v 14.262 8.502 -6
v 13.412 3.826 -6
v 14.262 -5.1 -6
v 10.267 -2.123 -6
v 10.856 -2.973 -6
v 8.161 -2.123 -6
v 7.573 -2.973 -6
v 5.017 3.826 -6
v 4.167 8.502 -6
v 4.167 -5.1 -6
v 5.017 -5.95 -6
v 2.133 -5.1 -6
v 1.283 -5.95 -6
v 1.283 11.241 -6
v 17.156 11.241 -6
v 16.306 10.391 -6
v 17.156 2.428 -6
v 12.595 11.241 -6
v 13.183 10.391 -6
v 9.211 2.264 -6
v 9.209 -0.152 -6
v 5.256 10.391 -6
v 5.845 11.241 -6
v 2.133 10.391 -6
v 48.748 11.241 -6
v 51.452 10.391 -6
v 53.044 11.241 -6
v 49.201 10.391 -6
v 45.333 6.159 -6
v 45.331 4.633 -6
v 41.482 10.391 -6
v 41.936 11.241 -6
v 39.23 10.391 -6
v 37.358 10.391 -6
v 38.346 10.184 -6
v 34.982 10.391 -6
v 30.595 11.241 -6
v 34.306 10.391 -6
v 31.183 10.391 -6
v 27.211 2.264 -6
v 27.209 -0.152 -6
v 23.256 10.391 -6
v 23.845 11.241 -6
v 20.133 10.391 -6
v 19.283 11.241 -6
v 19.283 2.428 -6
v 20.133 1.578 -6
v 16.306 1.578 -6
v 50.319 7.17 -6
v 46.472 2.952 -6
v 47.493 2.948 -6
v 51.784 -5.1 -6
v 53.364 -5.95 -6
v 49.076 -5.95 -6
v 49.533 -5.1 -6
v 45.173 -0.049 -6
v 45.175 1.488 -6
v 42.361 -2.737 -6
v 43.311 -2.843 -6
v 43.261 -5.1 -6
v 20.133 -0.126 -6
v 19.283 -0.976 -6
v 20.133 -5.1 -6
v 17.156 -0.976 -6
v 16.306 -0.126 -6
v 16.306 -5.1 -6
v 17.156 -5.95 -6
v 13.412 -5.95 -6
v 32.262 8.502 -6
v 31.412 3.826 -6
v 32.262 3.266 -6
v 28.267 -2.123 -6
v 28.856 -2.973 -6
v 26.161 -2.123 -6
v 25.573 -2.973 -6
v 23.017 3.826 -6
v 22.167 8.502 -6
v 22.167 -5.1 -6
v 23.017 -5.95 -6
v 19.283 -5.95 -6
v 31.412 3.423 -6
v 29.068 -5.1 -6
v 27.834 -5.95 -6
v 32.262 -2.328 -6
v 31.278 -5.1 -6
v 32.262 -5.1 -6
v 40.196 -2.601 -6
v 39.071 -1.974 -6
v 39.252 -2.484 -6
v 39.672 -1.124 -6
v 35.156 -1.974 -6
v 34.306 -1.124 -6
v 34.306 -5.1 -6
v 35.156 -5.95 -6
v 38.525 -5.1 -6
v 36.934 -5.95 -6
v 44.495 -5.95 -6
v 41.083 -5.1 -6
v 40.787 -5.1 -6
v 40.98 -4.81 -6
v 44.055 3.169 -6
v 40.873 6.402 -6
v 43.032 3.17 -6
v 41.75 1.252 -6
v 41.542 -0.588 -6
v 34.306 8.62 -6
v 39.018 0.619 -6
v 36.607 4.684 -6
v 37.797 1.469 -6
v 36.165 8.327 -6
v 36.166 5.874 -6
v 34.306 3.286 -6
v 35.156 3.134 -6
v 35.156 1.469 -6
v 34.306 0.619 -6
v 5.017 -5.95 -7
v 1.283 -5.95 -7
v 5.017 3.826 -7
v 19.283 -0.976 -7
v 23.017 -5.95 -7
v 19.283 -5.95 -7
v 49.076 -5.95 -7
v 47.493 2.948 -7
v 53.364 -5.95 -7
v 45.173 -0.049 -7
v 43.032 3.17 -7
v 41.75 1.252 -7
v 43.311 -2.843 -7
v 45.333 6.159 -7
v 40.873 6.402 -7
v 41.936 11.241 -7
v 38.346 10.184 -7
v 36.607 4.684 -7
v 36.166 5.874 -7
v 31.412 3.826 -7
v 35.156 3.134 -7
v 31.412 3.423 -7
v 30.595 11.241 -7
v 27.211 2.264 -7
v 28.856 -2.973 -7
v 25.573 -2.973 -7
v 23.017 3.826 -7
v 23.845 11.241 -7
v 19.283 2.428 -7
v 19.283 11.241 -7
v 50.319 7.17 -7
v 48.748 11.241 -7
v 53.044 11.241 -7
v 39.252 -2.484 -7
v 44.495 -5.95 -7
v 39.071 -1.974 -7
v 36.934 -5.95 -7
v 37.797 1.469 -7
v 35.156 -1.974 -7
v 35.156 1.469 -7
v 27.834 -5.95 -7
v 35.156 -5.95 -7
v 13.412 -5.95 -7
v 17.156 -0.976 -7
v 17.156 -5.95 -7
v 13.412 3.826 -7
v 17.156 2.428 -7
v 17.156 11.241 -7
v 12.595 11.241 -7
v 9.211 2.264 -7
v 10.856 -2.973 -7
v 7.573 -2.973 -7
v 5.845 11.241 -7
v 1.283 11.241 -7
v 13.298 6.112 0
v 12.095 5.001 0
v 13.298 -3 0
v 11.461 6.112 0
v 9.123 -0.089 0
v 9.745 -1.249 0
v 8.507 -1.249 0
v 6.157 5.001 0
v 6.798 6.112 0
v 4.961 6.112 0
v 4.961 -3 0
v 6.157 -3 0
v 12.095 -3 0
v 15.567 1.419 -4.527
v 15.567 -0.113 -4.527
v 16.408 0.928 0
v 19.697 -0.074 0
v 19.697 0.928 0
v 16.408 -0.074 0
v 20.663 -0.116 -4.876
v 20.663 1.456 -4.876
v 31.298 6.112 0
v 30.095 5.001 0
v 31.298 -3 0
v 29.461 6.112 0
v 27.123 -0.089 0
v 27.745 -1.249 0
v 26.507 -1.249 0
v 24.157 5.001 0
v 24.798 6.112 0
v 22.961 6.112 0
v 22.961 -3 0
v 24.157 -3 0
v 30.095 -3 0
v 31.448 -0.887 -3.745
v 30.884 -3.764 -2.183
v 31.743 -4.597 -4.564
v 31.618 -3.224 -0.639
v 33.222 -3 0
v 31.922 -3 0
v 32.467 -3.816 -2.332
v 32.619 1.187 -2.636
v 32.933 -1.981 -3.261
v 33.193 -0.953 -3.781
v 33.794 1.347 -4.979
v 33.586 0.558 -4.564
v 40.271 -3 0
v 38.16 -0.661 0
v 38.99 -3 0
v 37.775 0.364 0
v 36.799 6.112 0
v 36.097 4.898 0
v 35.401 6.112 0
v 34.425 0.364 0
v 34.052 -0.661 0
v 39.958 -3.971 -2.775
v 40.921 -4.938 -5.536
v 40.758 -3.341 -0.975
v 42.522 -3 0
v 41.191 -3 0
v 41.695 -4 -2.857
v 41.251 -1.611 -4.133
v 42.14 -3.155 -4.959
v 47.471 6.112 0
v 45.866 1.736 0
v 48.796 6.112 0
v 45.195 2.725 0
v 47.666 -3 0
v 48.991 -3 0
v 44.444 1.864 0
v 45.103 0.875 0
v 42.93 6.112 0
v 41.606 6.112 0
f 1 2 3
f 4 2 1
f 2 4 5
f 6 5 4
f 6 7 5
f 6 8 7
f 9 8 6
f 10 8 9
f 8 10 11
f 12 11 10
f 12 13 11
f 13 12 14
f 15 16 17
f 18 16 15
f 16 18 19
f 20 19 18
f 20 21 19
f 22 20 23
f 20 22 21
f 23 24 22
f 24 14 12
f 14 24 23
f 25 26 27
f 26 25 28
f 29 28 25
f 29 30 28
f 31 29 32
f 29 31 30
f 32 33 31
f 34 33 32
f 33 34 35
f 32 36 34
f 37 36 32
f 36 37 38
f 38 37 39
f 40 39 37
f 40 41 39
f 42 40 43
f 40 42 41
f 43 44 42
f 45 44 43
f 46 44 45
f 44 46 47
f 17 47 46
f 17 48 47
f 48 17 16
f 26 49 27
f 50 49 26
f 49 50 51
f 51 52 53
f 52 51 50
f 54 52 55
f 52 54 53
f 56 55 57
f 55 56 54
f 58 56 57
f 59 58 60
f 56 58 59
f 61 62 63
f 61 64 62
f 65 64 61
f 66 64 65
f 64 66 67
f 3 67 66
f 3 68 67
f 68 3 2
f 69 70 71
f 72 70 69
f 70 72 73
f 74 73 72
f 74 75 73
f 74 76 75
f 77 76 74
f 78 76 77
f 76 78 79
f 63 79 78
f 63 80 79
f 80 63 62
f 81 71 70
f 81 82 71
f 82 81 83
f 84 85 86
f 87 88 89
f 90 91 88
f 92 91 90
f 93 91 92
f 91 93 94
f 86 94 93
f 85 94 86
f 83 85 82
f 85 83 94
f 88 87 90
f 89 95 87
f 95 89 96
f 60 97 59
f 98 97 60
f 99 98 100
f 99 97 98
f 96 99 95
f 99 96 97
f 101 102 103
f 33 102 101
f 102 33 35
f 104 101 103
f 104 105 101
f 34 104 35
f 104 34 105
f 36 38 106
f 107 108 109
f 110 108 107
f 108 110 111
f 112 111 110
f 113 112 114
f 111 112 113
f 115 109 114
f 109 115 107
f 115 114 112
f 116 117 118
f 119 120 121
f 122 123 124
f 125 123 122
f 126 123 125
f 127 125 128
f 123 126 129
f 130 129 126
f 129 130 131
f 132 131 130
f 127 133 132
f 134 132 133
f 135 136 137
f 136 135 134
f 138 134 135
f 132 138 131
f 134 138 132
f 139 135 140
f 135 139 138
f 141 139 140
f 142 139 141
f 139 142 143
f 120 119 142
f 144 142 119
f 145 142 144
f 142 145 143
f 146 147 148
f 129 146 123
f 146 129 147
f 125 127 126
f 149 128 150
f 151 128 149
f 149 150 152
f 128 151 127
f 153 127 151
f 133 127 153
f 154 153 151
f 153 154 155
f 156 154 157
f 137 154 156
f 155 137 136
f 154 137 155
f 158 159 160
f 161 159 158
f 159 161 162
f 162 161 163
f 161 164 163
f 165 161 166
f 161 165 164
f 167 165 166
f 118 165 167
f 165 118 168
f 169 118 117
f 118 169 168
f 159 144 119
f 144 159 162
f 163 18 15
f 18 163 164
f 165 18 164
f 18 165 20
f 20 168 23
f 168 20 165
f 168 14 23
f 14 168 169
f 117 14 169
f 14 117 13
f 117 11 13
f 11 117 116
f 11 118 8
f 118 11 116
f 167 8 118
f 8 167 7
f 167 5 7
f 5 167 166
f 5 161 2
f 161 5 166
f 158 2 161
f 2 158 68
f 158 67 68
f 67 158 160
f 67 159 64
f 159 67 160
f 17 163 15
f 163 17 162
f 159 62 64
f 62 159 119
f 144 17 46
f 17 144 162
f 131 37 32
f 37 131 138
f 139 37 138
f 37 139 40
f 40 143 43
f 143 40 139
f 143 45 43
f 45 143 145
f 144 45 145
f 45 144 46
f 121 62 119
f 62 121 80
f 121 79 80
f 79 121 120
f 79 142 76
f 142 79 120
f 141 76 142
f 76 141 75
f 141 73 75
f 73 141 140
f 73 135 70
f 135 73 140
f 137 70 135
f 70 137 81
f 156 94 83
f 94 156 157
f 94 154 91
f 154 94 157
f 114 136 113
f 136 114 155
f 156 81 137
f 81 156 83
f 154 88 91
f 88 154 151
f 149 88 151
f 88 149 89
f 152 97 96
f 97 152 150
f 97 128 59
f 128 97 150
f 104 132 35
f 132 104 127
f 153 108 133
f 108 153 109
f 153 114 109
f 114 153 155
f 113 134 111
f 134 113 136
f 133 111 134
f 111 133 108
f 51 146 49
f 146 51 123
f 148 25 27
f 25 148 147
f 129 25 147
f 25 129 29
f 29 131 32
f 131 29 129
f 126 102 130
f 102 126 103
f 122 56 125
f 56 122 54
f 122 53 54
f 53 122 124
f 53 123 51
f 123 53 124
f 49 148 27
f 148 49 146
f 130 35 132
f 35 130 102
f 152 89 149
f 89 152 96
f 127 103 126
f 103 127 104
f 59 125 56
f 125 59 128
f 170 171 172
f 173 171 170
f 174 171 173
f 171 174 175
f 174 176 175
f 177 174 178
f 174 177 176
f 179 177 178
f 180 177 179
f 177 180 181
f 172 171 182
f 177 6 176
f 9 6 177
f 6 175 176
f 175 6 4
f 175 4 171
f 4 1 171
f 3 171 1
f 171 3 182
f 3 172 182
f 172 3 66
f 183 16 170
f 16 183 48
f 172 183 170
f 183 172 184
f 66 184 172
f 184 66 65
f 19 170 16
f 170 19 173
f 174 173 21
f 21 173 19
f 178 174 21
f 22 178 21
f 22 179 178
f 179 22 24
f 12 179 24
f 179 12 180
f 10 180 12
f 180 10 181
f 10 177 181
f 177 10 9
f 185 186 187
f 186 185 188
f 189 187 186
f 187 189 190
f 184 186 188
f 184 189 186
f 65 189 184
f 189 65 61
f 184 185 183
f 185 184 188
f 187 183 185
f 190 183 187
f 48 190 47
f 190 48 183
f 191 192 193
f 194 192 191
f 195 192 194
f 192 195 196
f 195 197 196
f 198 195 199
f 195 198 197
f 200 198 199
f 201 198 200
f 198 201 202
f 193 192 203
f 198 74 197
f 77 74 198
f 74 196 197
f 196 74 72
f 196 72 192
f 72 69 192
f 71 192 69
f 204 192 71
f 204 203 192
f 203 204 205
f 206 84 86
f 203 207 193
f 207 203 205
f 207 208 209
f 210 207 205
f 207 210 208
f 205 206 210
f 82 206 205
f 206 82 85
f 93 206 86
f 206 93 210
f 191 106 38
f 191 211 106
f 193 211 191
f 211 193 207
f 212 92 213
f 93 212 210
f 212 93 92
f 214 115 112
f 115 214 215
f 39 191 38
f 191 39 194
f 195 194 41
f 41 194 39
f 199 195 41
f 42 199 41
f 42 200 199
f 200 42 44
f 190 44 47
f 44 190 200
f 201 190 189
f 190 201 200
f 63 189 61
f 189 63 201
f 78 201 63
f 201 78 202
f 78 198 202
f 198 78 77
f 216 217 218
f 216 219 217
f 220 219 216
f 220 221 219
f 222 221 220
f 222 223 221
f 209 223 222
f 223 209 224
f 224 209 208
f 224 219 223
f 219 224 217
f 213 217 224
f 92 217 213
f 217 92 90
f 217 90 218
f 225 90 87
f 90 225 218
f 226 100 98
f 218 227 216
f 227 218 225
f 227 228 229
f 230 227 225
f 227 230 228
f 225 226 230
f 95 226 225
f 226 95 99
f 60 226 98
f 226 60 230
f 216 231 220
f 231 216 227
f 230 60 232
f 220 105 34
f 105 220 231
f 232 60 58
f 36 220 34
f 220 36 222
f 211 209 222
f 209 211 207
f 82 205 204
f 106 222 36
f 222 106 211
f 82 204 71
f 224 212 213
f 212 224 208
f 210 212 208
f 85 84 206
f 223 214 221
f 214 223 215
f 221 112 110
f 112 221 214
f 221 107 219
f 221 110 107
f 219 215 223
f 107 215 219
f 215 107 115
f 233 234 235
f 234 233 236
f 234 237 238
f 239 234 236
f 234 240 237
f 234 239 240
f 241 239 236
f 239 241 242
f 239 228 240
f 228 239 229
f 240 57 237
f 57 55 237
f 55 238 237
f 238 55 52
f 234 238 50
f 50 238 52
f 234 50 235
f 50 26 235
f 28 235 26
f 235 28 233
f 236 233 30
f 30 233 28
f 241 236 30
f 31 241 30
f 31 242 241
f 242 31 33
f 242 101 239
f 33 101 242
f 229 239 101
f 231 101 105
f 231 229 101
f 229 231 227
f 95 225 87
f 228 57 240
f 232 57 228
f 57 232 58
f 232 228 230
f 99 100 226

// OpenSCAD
// Champhered_Nameplate.scad
// https://www.thingiverse.com/thing:3089014
// removed the inlcuded fontlist that wasn't on my pc 9/8/18

//Set the text to render
textstring="M-MAX";

//Font name
fontname= "Old English Text MT:style=Regular"; // pick from font list off of help menu


//type
type="tag"; //[container, tag, hollow]

//where to extrude
shiftit=0.3;

//scaling up
scale=1.7;

//Text height (extrusion) in mm
textheight=6;

//Set font size in mm
textsize=10; 

//wall thickness
wall=1;

//text kerning - in font size
width_factor=.9;

//rim to combine the text
rim=0.5;

//close gaps e.g. to the dot of an i...
delta=0.5;
    


/* [Hidden] */
//-------------------------------------------------------------------------------
function is_monospaced() = 
    (fontname=="Cutive Mono" || fontname=="Droid Sans Mono" ||fontname=="Fira Mono" ||fontname=="Nova Mono" ||fontname=="PT Mono" ||fontname=="Rubik Mono" ||fontname=="Share Tech Mono" ||fontname=="Ubuntu Mono" )? 1 : 0;

echo (is_monospaced()) ;
width_big=textsize*width_factor;
width_small=textsize*width_factor*(is_monospaced()?1:.75);
width_tiny=textsize*width_factor*(is_monospaced()?1:.25);

function is_narrow_letter(c) =
    (c=="t" ||c=="f" || c=="l" || c=="i" || c=="j") ? 1 : 0;
function is_space(c) =
    (c=="." ||c==";" || c==" ") ? 1 : 0;
function width(c,d) = 
    (is_narrow_letter(c)==1 && is_narrow_letter(d)==1) ? width_small/2 : 
    (is_narrow_letter(c)==1 || is_narrow_letter(d)==1) ? width_small : 
    (is_space(c)==1 && is_space(d)==1) ? width_tiny/2 : 
    (is_space(c)==1 || is_space(d)==1) ? width_tiny : 
    width_big;
    
function widthfunction(i) = width(textstring[i-1],textstring[i-2]);
function totalwidthfunction(x) = x < 1 ? 0 : widthfunction(x) + totalwidthfunction(x - 1);
//input = [1, 3, 5, 8];
width = [for (a = [ 1 : len(textstring) ]) totalwidthfunction(a) ];
echo(width); // ECHO: [1, 6, 15, 36]

dummy_cutoutlen=len(textstring)*textsize;

/*
Customizable Text Storage Box
Version 7, November 2017
Written by MC Geisler (mcgenki at gmail dot com)

If you need to store Stuff in letters, this is the way to go.
Each letter and also the dots of 'i' and 'j' are connected together, so after printing it will not fall apart.
Have fun!

License: Attribution 4.0 International (CC BY 4.0)

You are free to:
    Share - copy and redistribute the material in any medium or format
    Adapt - remix, transform, and build upon the material
    for any purpose, even commercially.
*/

    
module writetext(textstr, sizeit)
{
    text(textstr,size=sizeit*.9,font=fontname,halign="center",valign="baseline");
}

module RiseText(textstr, textsize,textheight) 
{
    difference()
    {
        union()
        {
            for(i=[0:1:len(textstr)-1])
            {
                //extruded text
                translate([width[i],0,0])
                    linear_extrude(height=textheight,convexity = 32, scale = scale)
                        translate([0,-textsize*shiftit,0])
                            writetext(textstr[i], textsize);
                               
                //backplane
                if(type=="tag")
                {
                    translate([width[i],0,textheight-0*wall])
                        linear_extrude(height=wall,convexity = 32)
                            scale([scale,scale,1])
                                translate([0,-textsize*shiftit,0])
                                    offset(delta=-delta)   
                                        offset(delta=delta+rim)
                                            writetext(textstr[i], textsize);     


                    translate([width[i],0,textheight-0*wall])
                        linear_extrude(height=wall,convexity = 32)
                                    scale([scale,scale,1])
                                       translate([0,-textsize*shiftit,0])
                                            offset(delta=rim)
                                                writetext(textstr[i], textsize);      
                }
            }

        
        }

        if (type=="container")
        {
            translate([0,0,wall])
                for(i=[0:1:len(textstr)-1])
                {
                    translate([width[i],0,0])
                        linear_extrude(height=textheight,convexity = 32, scale = scale)
                            translate([0,-textsize*shiftit,0])
                                offset(delta=-wall)
                                    writetext(textstr[i], textsize);
                }
        }
    
 
        if (type=="hollow")
        scale([1,1,1])
            translate([0,0,-wall])
                for(i=[0:1:len(textstr)-1])
                {
                    translate([width[i],0,0])
                        linear_extrude(height=textheight,convexity = 32, scale = 0.3)
                            translate([0,-textsize*shiftit,0])
                               //offset(delta=-wall)
                                    writetext(textstr[i], textsize);
                }
    
    
    }
}


if (type=="tag" || type=="hollow")
{
   scale([1,1,-1])
        RiseText(textstring,textsize,textheight);
}
else
{
    RiseText(textstring,textsize,textheight);
}
